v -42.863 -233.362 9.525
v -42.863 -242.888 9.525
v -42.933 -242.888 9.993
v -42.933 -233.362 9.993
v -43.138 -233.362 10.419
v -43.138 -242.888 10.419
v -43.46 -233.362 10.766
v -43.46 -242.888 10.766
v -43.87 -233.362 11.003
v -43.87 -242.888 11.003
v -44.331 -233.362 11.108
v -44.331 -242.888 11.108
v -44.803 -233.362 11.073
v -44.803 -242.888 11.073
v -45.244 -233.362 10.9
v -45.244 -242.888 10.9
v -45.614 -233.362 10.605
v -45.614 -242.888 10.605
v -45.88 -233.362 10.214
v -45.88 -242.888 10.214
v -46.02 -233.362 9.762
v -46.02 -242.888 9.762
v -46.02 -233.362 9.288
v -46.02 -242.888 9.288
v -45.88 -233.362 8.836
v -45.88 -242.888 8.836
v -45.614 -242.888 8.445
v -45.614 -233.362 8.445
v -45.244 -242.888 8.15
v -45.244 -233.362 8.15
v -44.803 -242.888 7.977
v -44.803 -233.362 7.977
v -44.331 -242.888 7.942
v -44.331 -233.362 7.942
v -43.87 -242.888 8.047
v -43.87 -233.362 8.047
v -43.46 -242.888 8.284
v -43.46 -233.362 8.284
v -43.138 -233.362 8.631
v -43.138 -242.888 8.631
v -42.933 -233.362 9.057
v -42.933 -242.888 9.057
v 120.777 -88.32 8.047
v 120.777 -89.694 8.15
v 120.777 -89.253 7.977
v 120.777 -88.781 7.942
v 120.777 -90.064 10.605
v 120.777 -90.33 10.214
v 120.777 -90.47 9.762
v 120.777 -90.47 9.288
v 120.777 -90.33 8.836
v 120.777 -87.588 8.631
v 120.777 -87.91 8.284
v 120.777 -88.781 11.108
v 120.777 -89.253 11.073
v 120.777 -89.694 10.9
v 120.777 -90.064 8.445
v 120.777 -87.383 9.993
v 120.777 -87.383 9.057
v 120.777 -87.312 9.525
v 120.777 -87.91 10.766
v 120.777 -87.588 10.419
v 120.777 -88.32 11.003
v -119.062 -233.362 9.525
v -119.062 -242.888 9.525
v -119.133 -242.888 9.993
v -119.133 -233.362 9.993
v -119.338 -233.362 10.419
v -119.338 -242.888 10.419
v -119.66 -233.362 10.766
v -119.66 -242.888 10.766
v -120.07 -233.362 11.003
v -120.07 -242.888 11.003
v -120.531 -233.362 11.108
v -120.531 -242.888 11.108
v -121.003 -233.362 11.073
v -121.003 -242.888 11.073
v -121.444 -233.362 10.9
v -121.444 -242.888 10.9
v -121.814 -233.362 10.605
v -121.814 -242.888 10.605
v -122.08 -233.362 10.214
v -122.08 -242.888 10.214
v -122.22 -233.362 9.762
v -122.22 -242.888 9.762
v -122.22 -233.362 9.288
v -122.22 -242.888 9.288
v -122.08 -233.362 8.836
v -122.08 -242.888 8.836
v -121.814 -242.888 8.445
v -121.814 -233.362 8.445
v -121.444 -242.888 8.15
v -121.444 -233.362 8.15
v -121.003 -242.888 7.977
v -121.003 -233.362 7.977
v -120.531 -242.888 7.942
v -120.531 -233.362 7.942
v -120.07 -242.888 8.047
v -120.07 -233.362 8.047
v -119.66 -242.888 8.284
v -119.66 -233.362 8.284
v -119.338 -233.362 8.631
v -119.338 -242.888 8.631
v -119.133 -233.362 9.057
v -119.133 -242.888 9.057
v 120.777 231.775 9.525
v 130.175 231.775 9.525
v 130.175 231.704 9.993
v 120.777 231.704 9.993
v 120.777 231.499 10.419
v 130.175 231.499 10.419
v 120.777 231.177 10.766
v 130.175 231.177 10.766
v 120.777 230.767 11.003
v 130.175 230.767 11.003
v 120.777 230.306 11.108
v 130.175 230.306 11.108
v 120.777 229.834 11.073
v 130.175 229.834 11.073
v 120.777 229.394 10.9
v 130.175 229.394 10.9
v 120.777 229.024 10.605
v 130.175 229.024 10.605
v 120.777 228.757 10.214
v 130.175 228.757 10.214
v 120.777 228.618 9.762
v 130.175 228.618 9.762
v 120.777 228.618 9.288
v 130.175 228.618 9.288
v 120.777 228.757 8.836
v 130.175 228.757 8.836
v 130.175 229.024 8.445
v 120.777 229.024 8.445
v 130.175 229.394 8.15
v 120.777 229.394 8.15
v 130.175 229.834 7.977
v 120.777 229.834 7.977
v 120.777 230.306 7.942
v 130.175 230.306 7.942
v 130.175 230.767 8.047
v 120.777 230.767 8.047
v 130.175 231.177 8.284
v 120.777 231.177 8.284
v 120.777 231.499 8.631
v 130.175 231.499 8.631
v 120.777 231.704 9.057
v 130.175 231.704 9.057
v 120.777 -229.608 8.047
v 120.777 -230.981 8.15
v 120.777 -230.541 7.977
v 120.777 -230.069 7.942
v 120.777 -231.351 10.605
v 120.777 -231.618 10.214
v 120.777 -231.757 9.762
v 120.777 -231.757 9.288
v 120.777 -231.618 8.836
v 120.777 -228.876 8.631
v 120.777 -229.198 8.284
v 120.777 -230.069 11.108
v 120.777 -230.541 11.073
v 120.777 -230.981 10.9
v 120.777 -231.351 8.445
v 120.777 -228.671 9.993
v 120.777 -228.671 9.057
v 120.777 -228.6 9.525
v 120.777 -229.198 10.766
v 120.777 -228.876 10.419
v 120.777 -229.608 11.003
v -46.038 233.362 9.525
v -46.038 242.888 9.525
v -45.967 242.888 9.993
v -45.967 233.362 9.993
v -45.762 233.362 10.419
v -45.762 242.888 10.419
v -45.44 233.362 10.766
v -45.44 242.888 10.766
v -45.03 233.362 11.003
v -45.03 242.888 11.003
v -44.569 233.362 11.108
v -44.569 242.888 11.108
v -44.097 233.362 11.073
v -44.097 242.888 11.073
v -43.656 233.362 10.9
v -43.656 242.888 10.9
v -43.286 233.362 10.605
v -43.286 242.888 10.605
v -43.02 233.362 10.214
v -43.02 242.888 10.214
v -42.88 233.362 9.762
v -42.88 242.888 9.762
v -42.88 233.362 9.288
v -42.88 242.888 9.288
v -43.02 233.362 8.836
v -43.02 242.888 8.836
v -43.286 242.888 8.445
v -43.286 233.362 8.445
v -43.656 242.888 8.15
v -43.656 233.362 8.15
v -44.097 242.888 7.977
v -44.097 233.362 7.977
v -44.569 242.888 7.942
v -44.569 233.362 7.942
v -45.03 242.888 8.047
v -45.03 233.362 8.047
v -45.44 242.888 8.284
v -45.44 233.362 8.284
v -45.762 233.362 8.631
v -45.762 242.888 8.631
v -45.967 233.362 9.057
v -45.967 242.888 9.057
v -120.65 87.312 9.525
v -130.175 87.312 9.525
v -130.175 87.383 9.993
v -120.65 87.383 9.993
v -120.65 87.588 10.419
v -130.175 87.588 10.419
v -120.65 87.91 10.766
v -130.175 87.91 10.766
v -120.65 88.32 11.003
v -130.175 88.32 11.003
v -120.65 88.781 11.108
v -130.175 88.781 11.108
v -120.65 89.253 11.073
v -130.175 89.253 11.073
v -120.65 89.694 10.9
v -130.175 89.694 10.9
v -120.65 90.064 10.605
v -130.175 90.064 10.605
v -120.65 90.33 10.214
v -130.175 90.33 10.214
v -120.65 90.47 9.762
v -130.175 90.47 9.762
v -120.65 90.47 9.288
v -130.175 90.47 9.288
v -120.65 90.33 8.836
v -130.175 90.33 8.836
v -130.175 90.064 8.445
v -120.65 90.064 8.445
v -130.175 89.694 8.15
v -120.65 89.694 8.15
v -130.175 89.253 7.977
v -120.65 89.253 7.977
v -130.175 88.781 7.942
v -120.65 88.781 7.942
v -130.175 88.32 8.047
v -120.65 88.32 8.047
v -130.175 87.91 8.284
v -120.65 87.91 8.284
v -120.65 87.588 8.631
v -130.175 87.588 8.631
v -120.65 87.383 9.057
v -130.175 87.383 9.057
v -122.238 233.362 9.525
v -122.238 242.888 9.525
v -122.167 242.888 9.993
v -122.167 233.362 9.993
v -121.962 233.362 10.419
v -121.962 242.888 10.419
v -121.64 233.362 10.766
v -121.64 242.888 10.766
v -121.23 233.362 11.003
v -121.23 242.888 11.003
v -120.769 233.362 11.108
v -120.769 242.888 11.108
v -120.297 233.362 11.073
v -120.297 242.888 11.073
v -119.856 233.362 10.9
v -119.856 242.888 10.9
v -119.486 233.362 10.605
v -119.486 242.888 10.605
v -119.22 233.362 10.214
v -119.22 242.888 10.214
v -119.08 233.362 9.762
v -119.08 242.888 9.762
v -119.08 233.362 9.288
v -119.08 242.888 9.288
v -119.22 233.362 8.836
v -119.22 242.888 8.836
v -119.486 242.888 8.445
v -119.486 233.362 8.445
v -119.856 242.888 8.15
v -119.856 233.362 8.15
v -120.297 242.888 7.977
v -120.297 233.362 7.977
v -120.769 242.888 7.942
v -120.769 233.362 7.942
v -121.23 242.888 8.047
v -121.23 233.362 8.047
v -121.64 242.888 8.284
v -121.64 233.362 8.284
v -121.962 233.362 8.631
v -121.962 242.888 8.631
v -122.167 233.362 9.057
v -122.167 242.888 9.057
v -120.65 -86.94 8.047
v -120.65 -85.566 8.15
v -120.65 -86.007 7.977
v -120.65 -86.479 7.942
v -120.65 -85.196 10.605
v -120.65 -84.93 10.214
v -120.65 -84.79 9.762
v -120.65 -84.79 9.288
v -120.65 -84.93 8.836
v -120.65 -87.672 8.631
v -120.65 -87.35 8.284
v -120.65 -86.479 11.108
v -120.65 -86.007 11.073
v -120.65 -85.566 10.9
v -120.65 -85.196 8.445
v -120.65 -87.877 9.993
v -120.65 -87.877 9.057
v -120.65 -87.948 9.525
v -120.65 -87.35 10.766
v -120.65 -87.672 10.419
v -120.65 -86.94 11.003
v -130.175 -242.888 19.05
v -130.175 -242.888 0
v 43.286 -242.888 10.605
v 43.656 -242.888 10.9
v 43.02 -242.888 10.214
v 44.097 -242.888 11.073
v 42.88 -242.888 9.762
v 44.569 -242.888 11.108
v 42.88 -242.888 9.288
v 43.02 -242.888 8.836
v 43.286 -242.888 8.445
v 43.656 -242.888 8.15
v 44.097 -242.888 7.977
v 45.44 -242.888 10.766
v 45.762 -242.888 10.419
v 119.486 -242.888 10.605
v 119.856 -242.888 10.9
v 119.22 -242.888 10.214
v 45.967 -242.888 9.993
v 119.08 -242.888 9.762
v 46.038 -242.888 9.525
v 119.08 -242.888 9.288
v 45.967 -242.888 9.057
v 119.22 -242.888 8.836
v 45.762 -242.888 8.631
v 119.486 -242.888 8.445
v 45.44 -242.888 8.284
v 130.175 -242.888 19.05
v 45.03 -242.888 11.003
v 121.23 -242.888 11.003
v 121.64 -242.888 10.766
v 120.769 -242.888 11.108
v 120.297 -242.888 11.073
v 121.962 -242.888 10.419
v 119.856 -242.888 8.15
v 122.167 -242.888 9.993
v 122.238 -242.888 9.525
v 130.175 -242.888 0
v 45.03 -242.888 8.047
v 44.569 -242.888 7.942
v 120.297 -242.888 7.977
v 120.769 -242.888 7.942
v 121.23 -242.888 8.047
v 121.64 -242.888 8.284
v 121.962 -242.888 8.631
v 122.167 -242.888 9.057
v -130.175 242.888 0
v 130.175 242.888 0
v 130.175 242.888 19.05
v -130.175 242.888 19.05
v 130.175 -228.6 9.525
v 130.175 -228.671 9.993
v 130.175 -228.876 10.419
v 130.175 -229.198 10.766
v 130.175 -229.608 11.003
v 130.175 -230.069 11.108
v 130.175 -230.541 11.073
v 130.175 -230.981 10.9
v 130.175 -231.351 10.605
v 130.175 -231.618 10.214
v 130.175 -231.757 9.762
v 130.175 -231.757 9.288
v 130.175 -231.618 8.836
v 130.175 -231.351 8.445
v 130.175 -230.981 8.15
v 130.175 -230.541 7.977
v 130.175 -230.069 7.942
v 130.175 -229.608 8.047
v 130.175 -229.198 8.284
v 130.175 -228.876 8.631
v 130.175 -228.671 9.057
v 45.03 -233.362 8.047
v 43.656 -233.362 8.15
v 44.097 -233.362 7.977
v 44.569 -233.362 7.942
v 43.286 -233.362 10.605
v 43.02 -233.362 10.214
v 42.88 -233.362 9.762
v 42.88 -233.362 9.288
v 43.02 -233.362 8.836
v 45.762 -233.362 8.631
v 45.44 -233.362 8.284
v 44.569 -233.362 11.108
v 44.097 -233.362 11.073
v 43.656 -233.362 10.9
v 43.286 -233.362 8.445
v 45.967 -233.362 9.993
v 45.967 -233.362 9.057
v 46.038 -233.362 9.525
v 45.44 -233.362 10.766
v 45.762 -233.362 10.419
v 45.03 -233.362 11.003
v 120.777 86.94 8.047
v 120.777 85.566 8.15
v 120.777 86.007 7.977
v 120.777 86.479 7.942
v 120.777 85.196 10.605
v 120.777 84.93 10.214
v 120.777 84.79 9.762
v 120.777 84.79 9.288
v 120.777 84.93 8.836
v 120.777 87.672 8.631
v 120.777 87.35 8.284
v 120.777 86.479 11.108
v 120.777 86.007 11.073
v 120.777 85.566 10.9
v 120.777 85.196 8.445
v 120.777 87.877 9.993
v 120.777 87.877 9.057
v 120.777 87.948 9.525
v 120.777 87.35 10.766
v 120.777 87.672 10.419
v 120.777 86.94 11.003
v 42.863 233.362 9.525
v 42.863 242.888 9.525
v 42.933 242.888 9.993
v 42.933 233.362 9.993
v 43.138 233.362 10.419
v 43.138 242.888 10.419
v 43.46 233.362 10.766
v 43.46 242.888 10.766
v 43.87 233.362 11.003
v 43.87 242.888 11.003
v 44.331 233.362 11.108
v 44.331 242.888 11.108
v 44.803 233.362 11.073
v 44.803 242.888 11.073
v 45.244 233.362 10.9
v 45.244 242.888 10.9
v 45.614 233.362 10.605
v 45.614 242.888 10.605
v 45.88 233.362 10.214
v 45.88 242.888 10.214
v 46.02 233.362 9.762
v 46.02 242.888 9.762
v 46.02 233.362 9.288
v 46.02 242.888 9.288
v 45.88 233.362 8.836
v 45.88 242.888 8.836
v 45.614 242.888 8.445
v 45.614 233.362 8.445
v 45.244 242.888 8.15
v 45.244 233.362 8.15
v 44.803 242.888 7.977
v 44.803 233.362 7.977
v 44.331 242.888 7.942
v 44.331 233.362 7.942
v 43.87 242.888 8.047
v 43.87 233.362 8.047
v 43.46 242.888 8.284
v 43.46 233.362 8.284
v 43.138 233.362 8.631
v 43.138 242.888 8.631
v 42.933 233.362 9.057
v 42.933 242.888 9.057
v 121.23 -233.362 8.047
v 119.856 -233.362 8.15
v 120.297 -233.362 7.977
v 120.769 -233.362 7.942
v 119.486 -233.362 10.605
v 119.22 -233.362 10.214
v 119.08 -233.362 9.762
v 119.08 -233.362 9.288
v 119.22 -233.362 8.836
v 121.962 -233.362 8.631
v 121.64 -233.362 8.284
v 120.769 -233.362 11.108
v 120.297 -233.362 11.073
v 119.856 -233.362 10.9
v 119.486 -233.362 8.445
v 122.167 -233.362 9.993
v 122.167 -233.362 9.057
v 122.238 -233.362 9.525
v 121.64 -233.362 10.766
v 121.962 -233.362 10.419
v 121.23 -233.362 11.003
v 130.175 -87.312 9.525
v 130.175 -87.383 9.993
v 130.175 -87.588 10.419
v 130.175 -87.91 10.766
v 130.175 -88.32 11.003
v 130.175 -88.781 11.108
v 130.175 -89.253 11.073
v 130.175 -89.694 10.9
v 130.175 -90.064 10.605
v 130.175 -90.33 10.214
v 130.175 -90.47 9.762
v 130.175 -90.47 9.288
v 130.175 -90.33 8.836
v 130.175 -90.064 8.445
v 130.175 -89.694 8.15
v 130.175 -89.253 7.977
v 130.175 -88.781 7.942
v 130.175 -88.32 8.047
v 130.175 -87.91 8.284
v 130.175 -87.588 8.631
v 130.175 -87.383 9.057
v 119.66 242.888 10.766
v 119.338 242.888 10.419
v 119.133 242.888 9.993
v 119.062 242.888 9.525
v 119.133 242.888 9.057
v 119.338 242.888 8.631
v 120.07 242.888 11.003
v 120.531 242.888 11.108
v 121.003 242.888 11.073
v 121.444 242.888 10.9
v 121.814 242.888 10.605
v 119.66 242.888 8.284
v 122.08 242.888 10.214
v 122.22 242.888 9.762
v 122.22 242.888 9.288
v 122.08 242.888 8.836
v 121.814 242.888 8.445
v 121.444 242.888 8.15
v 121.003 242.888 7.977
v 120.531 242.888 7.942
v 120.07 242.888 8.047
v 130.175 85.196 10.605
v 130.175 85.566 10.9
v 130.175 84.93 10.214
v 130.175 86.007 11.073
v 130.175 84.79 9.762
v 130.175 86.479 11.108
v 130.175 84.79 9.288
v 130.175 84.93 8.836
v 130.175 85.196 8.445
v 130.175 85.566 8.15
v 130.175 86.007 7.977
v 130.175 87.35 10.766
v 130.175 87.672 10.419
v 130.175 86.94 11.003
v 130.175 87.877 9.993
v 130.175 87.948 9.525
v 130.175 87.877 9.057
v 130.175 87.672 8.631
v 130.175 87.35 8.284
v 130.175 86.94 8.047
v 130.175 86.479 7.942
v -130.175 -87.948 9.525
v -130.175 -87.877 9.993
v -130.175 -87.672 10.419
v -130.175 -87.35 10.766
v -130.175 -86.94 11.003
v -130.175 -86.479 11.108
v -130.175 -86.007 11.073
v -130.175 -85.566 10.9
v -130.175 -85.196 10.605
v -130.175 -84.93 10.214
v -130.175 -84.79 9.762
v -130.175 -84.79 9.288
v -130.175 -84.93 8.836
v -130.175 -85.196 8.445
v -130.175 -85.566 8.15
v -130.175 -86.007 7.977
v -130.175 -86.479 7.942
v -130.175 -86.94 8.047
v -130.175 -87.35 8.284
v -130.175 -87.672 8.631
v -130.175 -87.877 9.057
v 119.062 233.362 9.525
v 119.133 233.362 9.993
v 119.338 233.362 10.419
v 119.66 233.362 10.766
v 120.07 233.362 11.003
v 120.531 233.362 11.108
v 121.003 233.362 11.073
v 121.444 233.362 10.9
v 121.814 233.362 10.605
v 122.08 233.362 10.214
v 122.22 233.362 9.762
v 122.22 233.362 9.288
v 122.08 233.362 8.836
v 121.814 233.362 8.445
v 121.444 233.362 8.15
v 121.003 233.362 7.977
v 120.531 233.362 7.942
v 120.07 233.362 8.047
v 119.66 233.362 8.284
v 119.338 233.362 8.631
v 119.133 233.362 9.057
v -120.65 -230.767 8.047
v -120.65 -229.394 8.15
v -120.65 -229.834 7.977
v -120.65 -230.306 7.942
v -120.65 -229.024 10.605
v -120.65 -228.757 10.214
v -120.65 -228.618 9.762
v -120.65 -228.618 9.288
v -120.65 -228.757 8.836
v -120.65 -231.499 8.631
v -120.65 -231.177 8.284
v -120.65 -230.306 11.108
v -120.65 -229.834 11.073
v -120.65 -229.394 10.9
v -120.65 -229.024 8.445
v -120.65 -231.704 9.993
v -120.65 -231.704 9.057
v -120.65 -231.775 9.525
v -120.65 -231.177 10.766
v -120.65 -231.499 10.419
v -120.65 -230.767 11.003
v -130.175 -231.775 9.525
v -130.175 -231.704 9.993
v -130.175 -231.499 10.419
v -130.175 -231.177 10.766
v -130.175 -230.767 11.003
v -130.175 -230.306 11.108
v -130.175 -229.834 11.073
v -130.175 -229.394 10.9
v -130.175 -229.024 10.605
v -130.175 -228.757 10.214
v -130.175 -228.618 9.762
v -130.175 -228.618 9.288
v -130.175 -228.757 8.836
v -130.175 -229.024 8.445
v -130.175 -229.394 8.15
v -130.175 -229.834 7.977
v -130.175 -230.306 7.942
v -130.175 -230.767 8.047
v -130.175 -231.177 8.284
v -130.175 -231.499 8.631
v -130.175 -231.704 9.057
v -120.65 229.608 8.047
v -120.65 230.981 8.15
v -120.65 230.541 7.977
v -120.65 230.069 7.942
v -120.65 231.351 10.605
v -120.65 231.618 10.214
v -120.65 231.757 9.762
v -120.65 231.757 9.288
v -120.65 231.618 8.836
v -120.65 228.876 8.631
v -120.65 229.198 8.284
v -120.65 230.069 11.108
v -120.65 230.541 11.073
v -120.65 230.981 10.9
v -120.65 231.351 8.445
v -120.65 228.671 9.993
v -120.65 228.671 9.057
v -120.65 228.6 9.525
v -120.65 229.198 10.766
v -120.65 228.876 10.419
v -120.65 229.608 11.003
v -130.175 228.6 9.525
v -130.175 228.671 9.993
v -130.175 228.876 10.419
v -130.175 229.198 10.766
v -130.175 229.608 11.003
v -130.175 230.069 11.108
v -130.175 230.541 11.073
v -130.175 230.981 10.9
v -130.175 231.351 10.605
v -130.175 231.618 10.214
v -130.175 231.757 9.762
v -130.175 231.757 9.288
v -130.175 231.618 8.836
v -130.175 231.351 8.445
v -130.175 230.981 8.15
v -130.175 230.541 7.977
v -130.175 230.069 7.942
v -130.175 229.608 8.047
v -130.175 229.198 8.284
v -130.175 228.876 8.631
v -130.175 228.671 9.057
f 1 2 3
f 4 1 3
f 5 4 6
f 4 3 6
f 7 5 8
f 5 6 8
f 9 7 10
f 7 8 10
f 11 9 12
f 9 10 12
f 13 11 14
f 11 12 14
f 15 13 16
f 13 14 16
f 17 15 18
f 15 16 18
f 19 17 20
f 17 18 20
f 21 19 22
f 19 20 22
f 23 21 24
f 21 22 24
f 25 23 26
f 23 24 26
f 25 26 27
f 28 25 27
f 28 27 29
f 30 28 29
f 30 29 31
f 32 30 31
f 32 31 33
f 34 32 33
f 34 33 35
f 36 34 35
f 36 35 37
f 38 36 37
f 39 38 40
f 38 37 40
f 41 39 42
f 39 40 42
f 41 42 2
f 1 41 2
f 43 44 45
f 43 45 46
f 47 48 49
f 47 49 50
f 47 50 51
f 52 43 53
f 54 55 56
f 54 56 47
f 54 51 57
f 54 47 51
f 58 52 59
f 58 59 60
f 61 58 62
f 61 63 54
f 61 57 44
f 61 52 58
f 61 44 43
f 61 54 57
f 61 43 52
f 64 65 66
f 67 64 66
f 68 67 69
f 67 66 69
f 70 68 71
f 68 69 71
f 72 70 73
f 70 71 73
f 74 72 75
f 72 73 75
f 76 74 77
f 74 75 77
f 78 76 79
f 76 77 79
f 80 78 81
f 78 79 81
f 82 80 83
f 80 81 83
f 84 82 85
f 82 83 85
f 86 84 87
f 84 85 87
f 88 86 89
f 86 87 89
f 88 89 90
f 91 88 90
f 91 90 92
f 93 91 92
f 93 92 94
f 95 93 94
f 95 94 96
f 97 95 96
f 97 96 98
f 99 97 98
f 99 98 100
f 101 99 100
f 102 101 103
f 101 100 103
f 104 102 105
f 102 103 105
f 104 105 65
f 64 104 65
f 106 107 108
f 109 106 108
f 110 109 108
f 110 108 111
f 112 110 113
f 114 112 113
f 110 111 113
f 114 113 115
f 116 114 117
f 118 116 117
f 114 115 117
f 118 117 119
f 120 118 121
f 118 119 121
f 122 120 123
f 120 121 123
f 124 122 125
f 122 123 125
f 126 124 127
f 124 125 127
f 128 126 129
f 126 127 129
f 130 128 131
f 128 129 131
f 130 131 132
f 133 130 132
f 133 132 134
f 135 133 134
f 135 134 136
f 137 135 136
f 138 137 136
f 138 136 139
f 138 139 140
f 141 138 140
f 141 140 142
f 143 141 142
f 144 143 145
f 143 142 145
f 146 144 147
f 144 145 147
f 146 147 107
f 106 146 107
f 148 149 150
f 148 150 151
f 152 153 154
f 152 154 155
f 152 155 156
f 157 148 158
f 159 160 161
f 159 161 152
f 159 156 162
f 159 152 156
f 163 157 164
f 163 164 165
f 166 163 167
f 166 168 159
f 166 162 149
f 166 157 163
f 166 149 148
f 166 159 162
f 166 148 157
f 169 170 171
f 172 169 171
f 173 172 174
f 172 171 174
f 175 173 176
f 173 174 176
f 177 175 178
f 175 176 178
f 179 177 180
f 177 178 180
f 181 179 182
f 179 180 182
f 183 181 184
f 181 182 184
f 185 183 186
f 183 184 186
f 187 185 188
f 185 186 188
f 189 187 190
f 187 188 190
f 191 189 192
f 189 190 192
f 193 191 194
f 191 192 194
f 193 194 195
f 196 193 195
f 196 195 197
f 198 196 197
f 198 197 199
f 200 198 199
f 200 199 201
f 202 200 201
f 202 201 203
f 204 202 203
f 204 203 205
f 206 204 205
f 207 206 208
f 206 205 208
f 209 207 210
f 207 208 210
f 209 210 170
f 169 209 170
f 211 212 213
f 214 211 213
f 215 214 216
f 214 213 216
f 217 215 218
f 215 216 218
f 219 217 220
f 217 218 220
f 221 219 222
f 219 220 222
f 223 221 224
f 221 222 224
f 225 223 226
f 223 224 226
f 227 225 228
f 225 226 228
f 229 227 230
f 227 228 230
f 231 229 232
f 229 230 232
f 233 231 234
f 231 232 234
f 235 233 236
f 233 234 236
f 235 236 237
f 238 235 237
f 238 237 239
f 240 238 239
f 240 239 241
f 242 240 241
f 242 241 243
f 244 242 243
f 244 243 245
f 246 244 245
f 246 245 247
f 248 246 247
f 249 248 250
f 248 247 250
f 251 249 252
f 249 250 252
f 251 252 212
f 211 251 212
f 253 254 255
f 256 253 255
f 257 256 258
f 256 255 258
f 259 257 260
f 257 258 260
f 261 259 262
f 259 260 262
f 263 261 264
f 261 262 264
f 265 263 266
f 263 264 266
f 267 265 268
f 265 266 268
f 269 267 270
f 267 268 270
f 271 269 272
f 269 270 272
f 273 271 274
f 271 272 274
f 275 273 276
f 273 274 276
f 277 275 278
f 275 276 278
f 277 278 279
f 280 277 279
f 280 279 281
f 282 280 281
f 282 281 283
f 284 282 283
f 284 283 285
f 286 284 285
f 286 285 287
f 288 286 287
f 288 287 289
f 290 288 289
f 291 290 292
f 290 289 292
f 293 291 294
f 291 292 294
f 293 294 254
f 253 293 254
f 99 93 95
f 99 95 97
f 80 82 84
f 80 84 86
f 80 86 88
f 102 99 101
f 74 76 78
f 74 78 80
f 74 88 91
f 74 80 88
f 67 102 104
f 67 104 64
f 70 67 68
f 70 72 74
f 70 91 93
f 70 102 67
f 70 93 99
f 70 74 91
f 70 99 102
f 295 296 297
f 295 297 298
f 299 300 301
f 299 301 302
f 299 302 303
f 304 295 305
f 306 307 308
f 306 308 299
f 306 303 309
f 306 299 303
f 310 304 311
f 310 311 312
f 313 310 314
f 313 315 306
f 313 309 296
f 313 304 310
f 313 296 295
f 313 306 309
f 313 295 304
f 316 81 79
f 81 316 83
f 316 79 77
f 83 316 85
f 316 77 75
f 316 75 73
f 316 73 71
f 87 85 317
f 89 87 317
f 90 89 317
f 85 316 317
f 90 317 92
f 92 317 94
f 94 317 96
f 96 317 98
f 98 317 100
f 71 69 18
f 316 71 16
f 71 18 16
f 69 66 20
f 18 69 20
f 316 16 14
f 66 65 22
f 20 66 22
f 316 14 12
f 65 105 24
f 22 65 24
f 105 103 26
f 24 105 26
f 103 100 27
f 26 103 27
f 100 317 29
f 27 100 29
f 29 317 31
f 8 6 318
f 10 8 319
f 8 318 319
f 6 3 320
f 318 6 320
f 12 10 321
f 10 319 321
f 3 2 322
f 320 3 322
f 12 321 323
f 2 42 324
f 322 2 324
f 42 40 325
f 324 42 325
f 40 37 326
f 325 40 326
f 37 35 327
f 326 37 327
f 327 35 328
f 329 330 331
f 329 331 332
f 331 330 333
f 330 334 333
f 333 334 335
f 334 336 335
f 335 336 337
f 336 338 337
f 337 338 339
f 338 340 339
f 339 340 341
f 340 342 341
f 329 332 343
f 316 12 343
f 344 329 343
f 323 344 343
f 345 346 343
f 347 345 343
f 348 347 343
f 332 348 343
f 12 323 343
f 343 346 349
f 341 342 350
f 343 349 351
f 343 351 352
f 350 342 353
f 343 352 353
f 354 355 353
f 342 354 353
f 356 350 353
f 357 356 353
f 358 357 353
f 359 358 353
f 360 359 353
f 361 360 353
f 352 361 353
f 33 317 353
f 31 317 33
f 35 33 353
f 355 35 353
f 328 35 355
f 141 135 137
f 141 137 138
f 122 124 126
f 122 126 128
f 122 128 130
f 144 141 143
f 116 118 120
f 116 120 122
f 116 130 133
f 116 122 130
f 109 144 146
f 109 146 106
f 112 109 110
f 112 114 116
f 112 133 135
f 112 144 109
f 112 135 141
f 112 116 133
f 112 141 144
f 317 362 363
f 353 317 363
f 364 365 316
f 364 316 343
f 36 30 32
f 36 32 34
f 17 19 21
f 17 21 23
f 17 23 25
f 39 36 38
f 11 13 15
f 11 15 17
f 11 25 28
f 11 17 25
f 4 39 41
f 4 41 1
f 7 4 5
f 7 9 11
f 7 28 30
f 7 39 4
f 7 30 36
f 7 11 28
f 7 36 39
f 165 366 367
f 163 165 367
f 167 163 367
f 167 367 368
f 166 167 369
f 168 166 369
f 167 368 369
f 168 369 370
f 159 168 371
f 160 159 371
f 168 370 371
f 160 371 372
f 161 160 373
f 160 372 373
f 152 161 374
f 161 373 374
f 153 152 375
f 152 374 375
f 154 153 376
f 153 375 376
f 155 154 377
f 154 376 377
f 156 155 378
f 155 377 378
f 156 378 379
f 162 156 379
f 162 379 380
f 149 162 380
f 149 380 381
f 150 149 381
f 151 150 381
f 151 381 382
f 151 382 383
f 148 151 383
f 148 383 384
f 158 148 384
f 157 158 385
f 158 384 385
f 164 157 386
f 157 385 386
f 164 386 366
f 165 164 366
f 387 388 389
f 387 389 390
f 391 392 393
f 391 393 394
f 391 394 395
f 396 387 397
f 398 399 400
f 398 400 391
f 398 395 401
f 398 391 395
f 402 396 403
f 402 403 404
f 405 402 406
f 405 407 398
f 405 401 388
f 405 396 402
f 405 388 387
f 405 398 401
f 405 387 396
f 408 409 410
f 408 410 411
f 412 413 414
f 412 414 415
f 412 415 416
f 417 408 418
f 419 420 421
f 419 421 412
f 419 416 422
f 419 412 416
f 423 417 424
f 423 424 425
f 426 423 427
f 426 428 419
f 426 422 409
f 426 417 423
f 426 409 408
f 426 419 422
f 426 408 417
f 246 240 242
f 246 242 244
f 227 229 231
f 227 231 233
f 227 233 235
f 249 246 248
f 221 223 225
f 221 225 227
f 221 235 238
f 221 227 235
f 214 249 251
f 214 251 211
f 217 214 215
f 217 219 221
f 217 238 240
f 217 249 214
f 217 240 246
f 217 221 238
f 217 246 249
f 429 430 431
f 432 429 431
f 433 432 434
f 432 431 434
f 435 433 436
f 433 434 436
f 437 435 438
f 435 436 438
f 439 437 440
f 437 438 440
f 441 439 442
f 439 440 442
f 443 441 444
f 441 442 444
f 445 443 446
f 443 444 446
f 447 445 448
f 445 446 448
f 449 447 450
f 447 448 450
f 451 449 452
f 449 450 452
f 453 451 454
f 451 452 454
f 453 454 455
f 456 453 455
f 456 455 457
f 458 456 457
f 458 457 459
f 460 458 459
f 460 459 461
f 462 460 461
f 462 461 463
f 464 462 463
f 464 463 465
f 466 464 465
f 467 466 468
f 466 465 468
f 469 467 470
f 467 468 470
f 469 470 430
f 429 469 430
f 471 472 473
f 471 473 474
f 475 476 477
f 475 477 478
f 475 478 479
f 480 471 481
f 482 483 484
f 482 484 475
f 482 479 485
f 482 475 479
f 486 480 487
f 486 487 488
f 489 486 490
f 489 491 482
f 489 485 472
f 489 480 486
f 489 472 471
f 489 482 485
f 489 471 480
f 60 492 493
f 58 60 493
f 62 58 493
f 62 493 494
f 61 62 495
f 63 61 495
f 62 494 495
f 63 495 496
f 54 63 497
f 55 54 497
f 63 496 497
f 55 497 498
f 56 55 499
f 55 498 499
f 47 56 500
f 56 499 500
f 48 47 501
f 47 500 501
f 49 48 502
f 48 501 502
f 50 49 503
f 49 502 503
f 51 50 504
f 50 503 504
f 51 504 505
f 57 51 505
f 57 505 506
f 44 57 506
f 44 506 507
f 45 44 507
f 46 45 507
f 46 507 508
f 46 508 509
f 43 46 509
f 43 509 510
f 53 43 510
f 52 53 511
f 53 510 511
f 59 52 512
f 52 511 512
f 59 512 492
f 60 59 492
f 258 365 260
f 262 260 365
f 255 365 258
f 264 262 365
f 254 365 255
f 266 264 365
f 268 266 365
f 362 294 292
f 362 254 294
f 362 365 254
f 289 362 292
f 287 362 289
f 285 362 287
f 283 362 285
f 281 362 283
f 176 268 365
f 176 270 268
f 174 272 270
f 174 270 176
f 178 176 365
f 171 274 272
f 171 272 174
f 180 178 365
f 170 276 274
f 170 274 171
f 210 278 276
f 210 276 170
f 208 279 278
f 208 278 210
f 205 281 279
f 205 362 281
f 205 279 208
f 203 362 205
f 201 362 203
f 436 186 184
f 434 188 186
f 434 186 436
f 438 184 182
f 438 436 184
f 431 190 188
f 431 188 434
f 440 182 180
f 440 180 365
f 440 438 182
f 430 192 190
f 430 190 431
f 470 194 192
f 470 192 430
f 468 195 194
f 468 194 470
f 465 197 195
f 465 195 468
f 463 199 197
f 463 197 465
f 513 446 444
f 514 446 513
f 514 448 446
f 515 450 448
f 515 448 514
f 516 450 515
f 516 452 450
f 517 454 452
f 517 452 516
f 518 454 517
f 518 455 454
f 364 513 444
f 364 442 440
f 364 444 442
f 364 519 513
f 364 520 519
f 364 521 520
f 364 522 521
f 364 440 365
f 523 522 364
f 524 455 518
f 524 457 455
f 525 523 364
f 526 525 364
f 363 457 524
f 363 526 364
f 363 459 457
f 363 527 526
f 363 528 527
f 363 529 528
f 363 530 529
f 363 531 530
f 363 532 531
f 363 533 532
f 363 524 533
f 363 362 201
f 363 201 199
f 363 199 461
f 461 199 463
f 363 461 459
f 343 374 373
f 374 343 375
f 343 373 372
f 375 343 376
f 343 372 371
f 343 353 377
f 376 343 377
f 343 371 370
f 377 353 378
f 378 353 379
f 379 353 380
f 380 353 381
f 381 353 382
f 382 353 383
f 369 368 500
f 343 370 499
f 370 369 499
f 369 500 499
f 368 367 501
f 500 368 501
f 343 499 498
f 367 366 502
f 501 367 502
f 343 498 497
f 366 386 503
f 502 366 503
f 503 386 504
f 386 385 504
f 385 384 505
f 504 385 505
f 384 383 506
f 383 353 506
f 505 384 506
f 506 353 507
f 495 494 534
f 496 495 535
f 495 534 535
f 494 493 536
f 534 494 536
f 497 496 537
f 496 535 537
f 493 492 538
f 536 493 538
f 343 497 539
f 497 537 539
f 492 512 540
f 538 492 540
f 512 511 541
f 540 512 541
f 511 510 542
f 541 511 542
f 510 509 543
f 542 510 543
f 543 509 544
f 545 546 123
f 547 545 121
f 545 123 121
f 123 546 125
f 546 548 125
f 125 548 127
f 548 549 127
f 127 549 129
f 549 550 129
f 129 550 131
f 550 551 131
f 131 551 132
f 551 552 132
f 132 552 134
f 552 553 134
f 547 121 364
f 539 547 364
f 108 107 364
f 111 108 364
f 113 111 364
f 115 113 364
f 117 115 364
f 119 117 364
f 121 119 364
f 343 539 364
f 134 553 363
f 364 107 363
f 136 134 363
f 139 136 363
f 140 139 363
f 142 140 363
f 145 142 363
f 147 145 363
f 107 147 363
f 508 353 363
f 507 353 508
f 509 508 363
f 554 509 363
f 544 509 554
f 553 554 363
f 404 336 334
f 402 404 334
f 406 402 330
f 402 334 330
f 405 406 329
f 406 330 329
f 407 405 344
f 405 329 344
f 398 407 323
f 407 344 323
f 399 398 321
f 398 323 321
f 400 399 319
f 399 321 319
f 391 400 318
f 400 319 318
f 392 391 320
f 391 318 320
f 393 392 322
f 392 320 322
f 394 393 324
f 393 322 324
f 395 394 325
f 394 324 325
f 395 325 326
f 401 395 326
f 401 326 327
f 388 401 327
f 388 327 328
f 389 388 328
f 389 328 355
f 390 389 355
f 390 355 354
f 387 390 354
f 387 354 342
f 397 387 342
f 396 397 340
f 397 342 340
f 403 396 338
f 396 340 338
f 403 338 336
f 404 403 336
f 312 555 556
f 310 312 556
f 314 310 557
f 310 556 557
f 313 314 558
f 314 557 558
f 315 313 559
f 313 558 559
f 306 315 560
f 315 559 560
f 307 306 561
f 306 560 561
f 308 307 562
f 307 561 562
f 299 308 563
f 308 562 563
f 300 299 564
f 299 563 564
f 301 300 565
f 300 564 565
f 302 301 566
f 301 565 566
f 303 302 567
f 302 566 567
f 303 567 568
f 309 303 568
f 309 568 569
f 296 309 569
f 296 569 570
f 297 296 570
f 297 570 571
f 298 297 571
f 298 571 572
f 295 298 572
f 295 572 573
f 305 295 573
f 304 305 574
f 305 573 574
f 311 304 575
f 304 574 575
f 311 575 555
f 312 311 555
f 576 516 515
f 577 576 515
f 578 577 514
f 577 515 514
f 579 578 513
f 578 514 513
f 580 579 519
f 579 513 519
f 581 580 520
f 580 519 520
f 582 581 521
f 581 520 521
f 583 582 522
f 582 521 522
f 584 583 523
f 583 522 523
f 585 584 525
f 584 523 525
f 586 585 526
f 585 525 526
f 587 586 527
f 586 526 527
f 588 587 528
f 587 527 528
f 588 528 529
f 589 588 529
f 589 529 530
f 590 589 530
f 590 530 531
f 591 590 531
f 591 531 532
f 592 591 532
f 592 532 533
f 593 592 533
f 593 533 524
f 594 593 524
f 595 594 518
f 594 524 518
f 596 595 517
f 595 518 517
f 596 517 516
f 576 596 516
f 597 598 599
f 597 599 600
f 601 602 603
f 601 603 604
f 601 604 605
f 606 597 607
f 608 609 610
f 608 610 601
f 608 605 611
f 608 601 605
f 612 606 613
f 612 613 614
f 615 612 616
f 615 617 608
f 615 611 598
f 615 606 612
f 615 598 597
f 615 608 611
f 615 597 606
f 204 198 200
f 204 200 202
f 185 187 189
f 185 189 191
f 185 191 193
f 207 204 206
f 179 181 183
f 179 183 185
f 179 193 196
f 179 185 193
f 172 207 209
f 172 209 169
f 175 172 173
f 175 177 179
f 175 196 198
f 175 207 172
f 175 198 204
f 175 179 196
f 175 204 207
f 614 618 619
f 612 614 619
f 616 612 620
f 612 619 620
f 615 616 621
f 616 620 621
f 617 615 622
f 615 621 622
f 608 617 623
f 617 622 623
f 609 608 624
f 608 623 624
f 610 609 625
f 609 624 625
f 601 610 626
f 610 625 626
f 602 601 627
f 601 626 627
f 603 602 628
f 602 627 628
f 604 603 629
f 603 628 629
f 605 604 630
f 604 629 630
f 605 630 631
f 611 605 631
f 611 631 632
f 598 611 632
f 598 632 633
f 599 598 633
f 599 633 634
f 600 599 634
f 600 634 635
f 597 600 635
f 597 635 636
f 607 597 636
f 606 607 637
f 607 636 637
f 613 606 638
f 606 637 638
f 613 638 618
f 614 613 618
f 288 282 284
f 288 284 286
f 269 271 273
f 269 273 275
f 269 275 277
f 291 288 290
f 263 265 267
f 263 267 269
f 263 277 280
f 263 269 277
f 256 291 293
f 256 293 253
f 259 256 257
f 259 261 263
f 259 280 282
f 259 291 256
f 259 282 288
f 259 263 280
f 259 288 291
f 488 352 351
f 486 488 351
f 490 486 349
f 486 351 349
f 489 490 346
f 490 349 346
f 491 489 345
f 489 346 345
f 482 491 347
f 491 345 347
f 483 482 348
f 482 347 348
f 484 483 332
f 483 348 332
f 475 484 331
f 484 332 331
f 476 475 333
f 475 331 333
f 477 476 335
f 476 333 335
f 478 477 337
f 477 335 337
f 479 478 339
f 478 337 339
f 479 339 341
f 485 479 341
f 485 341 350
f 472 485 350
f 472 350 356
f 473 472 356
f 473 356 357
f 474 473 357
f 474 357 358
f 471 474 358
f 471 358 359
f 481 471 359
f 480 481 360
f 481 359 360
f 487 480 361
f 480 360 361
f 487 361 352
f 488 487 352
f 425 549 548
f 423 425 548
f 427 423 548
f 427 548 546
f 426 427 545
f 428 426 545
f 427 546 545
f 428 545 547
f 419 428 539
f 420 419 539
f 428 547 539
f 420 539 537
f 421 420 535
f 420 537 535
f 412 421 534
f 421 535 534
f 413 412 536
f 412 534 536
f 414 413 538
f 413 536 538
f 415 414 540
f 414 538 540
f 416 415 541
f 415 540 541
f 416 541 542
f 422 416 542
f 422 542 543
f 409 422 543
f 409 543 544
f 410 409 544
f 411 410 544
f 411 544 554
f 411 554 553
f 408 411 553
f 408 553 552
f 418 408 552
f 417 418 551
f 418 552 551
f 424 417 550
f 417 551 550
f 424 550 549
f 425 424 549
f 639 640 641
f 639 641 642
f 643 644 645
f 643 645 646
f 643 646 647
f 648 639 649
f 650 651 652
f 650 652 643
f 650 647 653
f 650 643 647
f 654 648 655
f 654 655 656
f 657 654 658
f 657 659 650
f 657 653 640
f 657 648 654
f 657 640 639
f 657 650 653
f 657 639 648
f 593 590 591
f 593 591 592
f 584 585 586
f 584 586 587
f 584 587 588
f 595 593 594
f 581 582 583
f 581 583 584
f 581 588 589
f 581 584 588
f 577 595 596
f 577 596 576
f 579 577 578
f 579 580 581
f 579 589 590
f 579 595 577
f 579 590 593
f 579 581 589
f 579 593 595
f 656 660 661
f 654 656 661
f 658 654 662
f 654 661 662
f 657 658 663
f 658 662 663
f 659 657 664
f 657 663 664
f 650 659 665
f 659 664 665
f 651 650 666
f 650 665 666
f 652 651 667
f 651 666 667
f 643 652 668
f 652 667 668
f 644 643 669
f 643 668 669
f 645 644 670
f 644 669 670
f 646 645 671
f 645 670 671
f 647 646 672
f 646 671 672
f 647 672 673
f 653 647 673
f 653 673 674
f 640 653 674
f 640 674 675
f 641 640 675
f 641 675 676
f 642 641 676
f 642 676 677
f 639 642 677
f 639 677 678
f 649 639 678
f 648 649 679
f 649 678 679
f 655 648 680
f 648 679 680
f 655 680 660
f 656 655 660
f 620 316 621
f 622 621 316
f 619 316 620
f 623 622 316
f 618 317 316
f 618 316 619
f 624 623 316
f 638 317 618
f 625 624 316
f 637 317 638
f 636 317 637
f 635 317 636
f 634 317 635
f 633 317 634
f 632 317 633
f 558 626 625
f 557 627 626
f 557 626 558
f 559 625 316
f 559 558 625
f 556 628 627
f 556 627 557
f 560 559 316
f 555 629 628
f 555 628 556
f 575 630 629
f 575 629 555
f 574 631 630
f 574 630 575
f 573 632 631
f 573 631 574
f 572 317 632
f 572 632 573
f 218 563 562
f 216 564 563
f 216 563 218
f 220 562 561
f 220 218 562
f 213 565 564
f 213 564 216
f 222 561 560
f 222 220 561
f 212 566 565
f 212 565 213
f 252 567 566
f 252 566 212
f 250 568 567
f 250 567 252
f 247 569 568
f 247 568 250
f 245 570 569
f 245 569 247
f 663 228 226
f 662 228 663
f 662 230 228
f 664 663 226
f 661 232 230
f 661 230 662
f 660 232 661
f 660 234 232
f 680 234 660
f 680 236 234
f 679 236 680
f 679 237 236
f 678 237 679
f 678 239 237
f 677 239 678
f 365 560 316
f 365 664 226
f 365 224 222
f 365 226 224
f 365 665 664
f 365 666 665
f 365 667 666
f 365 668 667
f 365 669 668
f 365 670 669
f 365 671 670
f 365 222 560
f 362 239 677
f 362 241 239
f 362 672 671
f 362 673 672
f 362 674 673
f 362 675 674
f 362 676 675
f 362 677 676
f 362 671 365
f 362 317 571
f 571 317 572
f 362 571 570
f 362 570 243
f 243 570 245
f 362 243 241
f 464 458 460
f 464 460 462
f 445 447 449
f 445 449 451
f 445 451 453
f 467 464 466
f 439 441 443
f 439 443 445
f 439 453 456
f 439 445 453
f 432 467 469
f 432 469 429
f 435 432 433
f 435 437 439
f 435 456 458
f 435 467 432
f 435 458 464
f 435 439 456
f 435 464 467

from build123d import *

# Parameters (mm, degrees)
F0_W     = 260.35
F0_H     = 485.775
F1_DEPTH = 19.05
F2_R     = 1.5875
F4_DEPTH = 9.398
F3_R     = 1.5875
F5_DEPTH = 9.525
F7_R     = 1.5875
F8_DEPTH = 9.525
F6_R     = 1.5875
F9_DEPTH = 9.525


with BuildPart() as f1:
    # F0 (on Top) → F1 (new body)
    with BuildSketch(Plane.XY):
        Rectangle(F0_W, F0_H)
    extrude(amount=F1_DEPTH)

    # F2 (on face) → F4 (cut)
    with BuildSketch(Plane.YZ.offset(130.175)):
        with Locations((230.1875, 9.525)):
            Circle(F2_R)
        with Locations((86.36, 9.525)):
            Circle(F2_R)
        with Locations((-88.9, 9.525)):
            Circle(F2_R)
        with Locations((-230.1875, 9.525)):
            Circle(F2_R)
    extrude(amount=-F4_DEPTH, mode=Mode.SUBTRACT)

    # F3 (on face) → F5 (cut)
    with BuildSketch(Plane(origin=(-130.175, 0, 0), x_dir=(0, -1, 0), z_dir=(-1, 0, 0))):
        with Locations((-230.1875, 9.525)):
            Circle(F3_R)
        with Locations((-88.9, 9.525)):
            Circle(F3_R)
        with Locations((86.36, 9.525)):
            Circle(F3_R)
        with Locations((230.1875, 9.525)):
            Circle(F3_R)
    extrude(amount=-F5_DEPTH, mode=Mode.SUBTRACT)

    # F7 (on face) → F8 (cut)
    with BuildSketch(Plane(origin=(0, 242.8875, 0), x_dir=(-1, 0, 0), z_dir=(0, 1, 0))):
        with Locations((-120.65, 9.525)):
            Circle(F7_R)
        with Locations((-44.45, 9.525)):
            Circle(F7_R)
        with Locations((44.45, 9.525)):
            Circle(F7_R)
        with Locations((120.65, 9.525)):
            Circle(F7_R)
    extrude(amount=-F8_DEPTH, mode=Mode.SUBTRACT)

    # F6 (on face) → F9 (cut)
    with BuildSketch(Plane.XZ.offset(242.8875)):
        with Locations((120.65, 9.525)):
            Circle(F6_R)
        with Locations((44.45, 9.525)):
            Circle(F6_R)
        with Locations((-44.45, 9.525)):
            Circle(F6_R)
        with Locations((-120.65, 9.525)):
            Circle(F6_R)
    extrude(amount=-F9_DEPTH, mode=Mode.SUBTRACT)


solid = f1.part
